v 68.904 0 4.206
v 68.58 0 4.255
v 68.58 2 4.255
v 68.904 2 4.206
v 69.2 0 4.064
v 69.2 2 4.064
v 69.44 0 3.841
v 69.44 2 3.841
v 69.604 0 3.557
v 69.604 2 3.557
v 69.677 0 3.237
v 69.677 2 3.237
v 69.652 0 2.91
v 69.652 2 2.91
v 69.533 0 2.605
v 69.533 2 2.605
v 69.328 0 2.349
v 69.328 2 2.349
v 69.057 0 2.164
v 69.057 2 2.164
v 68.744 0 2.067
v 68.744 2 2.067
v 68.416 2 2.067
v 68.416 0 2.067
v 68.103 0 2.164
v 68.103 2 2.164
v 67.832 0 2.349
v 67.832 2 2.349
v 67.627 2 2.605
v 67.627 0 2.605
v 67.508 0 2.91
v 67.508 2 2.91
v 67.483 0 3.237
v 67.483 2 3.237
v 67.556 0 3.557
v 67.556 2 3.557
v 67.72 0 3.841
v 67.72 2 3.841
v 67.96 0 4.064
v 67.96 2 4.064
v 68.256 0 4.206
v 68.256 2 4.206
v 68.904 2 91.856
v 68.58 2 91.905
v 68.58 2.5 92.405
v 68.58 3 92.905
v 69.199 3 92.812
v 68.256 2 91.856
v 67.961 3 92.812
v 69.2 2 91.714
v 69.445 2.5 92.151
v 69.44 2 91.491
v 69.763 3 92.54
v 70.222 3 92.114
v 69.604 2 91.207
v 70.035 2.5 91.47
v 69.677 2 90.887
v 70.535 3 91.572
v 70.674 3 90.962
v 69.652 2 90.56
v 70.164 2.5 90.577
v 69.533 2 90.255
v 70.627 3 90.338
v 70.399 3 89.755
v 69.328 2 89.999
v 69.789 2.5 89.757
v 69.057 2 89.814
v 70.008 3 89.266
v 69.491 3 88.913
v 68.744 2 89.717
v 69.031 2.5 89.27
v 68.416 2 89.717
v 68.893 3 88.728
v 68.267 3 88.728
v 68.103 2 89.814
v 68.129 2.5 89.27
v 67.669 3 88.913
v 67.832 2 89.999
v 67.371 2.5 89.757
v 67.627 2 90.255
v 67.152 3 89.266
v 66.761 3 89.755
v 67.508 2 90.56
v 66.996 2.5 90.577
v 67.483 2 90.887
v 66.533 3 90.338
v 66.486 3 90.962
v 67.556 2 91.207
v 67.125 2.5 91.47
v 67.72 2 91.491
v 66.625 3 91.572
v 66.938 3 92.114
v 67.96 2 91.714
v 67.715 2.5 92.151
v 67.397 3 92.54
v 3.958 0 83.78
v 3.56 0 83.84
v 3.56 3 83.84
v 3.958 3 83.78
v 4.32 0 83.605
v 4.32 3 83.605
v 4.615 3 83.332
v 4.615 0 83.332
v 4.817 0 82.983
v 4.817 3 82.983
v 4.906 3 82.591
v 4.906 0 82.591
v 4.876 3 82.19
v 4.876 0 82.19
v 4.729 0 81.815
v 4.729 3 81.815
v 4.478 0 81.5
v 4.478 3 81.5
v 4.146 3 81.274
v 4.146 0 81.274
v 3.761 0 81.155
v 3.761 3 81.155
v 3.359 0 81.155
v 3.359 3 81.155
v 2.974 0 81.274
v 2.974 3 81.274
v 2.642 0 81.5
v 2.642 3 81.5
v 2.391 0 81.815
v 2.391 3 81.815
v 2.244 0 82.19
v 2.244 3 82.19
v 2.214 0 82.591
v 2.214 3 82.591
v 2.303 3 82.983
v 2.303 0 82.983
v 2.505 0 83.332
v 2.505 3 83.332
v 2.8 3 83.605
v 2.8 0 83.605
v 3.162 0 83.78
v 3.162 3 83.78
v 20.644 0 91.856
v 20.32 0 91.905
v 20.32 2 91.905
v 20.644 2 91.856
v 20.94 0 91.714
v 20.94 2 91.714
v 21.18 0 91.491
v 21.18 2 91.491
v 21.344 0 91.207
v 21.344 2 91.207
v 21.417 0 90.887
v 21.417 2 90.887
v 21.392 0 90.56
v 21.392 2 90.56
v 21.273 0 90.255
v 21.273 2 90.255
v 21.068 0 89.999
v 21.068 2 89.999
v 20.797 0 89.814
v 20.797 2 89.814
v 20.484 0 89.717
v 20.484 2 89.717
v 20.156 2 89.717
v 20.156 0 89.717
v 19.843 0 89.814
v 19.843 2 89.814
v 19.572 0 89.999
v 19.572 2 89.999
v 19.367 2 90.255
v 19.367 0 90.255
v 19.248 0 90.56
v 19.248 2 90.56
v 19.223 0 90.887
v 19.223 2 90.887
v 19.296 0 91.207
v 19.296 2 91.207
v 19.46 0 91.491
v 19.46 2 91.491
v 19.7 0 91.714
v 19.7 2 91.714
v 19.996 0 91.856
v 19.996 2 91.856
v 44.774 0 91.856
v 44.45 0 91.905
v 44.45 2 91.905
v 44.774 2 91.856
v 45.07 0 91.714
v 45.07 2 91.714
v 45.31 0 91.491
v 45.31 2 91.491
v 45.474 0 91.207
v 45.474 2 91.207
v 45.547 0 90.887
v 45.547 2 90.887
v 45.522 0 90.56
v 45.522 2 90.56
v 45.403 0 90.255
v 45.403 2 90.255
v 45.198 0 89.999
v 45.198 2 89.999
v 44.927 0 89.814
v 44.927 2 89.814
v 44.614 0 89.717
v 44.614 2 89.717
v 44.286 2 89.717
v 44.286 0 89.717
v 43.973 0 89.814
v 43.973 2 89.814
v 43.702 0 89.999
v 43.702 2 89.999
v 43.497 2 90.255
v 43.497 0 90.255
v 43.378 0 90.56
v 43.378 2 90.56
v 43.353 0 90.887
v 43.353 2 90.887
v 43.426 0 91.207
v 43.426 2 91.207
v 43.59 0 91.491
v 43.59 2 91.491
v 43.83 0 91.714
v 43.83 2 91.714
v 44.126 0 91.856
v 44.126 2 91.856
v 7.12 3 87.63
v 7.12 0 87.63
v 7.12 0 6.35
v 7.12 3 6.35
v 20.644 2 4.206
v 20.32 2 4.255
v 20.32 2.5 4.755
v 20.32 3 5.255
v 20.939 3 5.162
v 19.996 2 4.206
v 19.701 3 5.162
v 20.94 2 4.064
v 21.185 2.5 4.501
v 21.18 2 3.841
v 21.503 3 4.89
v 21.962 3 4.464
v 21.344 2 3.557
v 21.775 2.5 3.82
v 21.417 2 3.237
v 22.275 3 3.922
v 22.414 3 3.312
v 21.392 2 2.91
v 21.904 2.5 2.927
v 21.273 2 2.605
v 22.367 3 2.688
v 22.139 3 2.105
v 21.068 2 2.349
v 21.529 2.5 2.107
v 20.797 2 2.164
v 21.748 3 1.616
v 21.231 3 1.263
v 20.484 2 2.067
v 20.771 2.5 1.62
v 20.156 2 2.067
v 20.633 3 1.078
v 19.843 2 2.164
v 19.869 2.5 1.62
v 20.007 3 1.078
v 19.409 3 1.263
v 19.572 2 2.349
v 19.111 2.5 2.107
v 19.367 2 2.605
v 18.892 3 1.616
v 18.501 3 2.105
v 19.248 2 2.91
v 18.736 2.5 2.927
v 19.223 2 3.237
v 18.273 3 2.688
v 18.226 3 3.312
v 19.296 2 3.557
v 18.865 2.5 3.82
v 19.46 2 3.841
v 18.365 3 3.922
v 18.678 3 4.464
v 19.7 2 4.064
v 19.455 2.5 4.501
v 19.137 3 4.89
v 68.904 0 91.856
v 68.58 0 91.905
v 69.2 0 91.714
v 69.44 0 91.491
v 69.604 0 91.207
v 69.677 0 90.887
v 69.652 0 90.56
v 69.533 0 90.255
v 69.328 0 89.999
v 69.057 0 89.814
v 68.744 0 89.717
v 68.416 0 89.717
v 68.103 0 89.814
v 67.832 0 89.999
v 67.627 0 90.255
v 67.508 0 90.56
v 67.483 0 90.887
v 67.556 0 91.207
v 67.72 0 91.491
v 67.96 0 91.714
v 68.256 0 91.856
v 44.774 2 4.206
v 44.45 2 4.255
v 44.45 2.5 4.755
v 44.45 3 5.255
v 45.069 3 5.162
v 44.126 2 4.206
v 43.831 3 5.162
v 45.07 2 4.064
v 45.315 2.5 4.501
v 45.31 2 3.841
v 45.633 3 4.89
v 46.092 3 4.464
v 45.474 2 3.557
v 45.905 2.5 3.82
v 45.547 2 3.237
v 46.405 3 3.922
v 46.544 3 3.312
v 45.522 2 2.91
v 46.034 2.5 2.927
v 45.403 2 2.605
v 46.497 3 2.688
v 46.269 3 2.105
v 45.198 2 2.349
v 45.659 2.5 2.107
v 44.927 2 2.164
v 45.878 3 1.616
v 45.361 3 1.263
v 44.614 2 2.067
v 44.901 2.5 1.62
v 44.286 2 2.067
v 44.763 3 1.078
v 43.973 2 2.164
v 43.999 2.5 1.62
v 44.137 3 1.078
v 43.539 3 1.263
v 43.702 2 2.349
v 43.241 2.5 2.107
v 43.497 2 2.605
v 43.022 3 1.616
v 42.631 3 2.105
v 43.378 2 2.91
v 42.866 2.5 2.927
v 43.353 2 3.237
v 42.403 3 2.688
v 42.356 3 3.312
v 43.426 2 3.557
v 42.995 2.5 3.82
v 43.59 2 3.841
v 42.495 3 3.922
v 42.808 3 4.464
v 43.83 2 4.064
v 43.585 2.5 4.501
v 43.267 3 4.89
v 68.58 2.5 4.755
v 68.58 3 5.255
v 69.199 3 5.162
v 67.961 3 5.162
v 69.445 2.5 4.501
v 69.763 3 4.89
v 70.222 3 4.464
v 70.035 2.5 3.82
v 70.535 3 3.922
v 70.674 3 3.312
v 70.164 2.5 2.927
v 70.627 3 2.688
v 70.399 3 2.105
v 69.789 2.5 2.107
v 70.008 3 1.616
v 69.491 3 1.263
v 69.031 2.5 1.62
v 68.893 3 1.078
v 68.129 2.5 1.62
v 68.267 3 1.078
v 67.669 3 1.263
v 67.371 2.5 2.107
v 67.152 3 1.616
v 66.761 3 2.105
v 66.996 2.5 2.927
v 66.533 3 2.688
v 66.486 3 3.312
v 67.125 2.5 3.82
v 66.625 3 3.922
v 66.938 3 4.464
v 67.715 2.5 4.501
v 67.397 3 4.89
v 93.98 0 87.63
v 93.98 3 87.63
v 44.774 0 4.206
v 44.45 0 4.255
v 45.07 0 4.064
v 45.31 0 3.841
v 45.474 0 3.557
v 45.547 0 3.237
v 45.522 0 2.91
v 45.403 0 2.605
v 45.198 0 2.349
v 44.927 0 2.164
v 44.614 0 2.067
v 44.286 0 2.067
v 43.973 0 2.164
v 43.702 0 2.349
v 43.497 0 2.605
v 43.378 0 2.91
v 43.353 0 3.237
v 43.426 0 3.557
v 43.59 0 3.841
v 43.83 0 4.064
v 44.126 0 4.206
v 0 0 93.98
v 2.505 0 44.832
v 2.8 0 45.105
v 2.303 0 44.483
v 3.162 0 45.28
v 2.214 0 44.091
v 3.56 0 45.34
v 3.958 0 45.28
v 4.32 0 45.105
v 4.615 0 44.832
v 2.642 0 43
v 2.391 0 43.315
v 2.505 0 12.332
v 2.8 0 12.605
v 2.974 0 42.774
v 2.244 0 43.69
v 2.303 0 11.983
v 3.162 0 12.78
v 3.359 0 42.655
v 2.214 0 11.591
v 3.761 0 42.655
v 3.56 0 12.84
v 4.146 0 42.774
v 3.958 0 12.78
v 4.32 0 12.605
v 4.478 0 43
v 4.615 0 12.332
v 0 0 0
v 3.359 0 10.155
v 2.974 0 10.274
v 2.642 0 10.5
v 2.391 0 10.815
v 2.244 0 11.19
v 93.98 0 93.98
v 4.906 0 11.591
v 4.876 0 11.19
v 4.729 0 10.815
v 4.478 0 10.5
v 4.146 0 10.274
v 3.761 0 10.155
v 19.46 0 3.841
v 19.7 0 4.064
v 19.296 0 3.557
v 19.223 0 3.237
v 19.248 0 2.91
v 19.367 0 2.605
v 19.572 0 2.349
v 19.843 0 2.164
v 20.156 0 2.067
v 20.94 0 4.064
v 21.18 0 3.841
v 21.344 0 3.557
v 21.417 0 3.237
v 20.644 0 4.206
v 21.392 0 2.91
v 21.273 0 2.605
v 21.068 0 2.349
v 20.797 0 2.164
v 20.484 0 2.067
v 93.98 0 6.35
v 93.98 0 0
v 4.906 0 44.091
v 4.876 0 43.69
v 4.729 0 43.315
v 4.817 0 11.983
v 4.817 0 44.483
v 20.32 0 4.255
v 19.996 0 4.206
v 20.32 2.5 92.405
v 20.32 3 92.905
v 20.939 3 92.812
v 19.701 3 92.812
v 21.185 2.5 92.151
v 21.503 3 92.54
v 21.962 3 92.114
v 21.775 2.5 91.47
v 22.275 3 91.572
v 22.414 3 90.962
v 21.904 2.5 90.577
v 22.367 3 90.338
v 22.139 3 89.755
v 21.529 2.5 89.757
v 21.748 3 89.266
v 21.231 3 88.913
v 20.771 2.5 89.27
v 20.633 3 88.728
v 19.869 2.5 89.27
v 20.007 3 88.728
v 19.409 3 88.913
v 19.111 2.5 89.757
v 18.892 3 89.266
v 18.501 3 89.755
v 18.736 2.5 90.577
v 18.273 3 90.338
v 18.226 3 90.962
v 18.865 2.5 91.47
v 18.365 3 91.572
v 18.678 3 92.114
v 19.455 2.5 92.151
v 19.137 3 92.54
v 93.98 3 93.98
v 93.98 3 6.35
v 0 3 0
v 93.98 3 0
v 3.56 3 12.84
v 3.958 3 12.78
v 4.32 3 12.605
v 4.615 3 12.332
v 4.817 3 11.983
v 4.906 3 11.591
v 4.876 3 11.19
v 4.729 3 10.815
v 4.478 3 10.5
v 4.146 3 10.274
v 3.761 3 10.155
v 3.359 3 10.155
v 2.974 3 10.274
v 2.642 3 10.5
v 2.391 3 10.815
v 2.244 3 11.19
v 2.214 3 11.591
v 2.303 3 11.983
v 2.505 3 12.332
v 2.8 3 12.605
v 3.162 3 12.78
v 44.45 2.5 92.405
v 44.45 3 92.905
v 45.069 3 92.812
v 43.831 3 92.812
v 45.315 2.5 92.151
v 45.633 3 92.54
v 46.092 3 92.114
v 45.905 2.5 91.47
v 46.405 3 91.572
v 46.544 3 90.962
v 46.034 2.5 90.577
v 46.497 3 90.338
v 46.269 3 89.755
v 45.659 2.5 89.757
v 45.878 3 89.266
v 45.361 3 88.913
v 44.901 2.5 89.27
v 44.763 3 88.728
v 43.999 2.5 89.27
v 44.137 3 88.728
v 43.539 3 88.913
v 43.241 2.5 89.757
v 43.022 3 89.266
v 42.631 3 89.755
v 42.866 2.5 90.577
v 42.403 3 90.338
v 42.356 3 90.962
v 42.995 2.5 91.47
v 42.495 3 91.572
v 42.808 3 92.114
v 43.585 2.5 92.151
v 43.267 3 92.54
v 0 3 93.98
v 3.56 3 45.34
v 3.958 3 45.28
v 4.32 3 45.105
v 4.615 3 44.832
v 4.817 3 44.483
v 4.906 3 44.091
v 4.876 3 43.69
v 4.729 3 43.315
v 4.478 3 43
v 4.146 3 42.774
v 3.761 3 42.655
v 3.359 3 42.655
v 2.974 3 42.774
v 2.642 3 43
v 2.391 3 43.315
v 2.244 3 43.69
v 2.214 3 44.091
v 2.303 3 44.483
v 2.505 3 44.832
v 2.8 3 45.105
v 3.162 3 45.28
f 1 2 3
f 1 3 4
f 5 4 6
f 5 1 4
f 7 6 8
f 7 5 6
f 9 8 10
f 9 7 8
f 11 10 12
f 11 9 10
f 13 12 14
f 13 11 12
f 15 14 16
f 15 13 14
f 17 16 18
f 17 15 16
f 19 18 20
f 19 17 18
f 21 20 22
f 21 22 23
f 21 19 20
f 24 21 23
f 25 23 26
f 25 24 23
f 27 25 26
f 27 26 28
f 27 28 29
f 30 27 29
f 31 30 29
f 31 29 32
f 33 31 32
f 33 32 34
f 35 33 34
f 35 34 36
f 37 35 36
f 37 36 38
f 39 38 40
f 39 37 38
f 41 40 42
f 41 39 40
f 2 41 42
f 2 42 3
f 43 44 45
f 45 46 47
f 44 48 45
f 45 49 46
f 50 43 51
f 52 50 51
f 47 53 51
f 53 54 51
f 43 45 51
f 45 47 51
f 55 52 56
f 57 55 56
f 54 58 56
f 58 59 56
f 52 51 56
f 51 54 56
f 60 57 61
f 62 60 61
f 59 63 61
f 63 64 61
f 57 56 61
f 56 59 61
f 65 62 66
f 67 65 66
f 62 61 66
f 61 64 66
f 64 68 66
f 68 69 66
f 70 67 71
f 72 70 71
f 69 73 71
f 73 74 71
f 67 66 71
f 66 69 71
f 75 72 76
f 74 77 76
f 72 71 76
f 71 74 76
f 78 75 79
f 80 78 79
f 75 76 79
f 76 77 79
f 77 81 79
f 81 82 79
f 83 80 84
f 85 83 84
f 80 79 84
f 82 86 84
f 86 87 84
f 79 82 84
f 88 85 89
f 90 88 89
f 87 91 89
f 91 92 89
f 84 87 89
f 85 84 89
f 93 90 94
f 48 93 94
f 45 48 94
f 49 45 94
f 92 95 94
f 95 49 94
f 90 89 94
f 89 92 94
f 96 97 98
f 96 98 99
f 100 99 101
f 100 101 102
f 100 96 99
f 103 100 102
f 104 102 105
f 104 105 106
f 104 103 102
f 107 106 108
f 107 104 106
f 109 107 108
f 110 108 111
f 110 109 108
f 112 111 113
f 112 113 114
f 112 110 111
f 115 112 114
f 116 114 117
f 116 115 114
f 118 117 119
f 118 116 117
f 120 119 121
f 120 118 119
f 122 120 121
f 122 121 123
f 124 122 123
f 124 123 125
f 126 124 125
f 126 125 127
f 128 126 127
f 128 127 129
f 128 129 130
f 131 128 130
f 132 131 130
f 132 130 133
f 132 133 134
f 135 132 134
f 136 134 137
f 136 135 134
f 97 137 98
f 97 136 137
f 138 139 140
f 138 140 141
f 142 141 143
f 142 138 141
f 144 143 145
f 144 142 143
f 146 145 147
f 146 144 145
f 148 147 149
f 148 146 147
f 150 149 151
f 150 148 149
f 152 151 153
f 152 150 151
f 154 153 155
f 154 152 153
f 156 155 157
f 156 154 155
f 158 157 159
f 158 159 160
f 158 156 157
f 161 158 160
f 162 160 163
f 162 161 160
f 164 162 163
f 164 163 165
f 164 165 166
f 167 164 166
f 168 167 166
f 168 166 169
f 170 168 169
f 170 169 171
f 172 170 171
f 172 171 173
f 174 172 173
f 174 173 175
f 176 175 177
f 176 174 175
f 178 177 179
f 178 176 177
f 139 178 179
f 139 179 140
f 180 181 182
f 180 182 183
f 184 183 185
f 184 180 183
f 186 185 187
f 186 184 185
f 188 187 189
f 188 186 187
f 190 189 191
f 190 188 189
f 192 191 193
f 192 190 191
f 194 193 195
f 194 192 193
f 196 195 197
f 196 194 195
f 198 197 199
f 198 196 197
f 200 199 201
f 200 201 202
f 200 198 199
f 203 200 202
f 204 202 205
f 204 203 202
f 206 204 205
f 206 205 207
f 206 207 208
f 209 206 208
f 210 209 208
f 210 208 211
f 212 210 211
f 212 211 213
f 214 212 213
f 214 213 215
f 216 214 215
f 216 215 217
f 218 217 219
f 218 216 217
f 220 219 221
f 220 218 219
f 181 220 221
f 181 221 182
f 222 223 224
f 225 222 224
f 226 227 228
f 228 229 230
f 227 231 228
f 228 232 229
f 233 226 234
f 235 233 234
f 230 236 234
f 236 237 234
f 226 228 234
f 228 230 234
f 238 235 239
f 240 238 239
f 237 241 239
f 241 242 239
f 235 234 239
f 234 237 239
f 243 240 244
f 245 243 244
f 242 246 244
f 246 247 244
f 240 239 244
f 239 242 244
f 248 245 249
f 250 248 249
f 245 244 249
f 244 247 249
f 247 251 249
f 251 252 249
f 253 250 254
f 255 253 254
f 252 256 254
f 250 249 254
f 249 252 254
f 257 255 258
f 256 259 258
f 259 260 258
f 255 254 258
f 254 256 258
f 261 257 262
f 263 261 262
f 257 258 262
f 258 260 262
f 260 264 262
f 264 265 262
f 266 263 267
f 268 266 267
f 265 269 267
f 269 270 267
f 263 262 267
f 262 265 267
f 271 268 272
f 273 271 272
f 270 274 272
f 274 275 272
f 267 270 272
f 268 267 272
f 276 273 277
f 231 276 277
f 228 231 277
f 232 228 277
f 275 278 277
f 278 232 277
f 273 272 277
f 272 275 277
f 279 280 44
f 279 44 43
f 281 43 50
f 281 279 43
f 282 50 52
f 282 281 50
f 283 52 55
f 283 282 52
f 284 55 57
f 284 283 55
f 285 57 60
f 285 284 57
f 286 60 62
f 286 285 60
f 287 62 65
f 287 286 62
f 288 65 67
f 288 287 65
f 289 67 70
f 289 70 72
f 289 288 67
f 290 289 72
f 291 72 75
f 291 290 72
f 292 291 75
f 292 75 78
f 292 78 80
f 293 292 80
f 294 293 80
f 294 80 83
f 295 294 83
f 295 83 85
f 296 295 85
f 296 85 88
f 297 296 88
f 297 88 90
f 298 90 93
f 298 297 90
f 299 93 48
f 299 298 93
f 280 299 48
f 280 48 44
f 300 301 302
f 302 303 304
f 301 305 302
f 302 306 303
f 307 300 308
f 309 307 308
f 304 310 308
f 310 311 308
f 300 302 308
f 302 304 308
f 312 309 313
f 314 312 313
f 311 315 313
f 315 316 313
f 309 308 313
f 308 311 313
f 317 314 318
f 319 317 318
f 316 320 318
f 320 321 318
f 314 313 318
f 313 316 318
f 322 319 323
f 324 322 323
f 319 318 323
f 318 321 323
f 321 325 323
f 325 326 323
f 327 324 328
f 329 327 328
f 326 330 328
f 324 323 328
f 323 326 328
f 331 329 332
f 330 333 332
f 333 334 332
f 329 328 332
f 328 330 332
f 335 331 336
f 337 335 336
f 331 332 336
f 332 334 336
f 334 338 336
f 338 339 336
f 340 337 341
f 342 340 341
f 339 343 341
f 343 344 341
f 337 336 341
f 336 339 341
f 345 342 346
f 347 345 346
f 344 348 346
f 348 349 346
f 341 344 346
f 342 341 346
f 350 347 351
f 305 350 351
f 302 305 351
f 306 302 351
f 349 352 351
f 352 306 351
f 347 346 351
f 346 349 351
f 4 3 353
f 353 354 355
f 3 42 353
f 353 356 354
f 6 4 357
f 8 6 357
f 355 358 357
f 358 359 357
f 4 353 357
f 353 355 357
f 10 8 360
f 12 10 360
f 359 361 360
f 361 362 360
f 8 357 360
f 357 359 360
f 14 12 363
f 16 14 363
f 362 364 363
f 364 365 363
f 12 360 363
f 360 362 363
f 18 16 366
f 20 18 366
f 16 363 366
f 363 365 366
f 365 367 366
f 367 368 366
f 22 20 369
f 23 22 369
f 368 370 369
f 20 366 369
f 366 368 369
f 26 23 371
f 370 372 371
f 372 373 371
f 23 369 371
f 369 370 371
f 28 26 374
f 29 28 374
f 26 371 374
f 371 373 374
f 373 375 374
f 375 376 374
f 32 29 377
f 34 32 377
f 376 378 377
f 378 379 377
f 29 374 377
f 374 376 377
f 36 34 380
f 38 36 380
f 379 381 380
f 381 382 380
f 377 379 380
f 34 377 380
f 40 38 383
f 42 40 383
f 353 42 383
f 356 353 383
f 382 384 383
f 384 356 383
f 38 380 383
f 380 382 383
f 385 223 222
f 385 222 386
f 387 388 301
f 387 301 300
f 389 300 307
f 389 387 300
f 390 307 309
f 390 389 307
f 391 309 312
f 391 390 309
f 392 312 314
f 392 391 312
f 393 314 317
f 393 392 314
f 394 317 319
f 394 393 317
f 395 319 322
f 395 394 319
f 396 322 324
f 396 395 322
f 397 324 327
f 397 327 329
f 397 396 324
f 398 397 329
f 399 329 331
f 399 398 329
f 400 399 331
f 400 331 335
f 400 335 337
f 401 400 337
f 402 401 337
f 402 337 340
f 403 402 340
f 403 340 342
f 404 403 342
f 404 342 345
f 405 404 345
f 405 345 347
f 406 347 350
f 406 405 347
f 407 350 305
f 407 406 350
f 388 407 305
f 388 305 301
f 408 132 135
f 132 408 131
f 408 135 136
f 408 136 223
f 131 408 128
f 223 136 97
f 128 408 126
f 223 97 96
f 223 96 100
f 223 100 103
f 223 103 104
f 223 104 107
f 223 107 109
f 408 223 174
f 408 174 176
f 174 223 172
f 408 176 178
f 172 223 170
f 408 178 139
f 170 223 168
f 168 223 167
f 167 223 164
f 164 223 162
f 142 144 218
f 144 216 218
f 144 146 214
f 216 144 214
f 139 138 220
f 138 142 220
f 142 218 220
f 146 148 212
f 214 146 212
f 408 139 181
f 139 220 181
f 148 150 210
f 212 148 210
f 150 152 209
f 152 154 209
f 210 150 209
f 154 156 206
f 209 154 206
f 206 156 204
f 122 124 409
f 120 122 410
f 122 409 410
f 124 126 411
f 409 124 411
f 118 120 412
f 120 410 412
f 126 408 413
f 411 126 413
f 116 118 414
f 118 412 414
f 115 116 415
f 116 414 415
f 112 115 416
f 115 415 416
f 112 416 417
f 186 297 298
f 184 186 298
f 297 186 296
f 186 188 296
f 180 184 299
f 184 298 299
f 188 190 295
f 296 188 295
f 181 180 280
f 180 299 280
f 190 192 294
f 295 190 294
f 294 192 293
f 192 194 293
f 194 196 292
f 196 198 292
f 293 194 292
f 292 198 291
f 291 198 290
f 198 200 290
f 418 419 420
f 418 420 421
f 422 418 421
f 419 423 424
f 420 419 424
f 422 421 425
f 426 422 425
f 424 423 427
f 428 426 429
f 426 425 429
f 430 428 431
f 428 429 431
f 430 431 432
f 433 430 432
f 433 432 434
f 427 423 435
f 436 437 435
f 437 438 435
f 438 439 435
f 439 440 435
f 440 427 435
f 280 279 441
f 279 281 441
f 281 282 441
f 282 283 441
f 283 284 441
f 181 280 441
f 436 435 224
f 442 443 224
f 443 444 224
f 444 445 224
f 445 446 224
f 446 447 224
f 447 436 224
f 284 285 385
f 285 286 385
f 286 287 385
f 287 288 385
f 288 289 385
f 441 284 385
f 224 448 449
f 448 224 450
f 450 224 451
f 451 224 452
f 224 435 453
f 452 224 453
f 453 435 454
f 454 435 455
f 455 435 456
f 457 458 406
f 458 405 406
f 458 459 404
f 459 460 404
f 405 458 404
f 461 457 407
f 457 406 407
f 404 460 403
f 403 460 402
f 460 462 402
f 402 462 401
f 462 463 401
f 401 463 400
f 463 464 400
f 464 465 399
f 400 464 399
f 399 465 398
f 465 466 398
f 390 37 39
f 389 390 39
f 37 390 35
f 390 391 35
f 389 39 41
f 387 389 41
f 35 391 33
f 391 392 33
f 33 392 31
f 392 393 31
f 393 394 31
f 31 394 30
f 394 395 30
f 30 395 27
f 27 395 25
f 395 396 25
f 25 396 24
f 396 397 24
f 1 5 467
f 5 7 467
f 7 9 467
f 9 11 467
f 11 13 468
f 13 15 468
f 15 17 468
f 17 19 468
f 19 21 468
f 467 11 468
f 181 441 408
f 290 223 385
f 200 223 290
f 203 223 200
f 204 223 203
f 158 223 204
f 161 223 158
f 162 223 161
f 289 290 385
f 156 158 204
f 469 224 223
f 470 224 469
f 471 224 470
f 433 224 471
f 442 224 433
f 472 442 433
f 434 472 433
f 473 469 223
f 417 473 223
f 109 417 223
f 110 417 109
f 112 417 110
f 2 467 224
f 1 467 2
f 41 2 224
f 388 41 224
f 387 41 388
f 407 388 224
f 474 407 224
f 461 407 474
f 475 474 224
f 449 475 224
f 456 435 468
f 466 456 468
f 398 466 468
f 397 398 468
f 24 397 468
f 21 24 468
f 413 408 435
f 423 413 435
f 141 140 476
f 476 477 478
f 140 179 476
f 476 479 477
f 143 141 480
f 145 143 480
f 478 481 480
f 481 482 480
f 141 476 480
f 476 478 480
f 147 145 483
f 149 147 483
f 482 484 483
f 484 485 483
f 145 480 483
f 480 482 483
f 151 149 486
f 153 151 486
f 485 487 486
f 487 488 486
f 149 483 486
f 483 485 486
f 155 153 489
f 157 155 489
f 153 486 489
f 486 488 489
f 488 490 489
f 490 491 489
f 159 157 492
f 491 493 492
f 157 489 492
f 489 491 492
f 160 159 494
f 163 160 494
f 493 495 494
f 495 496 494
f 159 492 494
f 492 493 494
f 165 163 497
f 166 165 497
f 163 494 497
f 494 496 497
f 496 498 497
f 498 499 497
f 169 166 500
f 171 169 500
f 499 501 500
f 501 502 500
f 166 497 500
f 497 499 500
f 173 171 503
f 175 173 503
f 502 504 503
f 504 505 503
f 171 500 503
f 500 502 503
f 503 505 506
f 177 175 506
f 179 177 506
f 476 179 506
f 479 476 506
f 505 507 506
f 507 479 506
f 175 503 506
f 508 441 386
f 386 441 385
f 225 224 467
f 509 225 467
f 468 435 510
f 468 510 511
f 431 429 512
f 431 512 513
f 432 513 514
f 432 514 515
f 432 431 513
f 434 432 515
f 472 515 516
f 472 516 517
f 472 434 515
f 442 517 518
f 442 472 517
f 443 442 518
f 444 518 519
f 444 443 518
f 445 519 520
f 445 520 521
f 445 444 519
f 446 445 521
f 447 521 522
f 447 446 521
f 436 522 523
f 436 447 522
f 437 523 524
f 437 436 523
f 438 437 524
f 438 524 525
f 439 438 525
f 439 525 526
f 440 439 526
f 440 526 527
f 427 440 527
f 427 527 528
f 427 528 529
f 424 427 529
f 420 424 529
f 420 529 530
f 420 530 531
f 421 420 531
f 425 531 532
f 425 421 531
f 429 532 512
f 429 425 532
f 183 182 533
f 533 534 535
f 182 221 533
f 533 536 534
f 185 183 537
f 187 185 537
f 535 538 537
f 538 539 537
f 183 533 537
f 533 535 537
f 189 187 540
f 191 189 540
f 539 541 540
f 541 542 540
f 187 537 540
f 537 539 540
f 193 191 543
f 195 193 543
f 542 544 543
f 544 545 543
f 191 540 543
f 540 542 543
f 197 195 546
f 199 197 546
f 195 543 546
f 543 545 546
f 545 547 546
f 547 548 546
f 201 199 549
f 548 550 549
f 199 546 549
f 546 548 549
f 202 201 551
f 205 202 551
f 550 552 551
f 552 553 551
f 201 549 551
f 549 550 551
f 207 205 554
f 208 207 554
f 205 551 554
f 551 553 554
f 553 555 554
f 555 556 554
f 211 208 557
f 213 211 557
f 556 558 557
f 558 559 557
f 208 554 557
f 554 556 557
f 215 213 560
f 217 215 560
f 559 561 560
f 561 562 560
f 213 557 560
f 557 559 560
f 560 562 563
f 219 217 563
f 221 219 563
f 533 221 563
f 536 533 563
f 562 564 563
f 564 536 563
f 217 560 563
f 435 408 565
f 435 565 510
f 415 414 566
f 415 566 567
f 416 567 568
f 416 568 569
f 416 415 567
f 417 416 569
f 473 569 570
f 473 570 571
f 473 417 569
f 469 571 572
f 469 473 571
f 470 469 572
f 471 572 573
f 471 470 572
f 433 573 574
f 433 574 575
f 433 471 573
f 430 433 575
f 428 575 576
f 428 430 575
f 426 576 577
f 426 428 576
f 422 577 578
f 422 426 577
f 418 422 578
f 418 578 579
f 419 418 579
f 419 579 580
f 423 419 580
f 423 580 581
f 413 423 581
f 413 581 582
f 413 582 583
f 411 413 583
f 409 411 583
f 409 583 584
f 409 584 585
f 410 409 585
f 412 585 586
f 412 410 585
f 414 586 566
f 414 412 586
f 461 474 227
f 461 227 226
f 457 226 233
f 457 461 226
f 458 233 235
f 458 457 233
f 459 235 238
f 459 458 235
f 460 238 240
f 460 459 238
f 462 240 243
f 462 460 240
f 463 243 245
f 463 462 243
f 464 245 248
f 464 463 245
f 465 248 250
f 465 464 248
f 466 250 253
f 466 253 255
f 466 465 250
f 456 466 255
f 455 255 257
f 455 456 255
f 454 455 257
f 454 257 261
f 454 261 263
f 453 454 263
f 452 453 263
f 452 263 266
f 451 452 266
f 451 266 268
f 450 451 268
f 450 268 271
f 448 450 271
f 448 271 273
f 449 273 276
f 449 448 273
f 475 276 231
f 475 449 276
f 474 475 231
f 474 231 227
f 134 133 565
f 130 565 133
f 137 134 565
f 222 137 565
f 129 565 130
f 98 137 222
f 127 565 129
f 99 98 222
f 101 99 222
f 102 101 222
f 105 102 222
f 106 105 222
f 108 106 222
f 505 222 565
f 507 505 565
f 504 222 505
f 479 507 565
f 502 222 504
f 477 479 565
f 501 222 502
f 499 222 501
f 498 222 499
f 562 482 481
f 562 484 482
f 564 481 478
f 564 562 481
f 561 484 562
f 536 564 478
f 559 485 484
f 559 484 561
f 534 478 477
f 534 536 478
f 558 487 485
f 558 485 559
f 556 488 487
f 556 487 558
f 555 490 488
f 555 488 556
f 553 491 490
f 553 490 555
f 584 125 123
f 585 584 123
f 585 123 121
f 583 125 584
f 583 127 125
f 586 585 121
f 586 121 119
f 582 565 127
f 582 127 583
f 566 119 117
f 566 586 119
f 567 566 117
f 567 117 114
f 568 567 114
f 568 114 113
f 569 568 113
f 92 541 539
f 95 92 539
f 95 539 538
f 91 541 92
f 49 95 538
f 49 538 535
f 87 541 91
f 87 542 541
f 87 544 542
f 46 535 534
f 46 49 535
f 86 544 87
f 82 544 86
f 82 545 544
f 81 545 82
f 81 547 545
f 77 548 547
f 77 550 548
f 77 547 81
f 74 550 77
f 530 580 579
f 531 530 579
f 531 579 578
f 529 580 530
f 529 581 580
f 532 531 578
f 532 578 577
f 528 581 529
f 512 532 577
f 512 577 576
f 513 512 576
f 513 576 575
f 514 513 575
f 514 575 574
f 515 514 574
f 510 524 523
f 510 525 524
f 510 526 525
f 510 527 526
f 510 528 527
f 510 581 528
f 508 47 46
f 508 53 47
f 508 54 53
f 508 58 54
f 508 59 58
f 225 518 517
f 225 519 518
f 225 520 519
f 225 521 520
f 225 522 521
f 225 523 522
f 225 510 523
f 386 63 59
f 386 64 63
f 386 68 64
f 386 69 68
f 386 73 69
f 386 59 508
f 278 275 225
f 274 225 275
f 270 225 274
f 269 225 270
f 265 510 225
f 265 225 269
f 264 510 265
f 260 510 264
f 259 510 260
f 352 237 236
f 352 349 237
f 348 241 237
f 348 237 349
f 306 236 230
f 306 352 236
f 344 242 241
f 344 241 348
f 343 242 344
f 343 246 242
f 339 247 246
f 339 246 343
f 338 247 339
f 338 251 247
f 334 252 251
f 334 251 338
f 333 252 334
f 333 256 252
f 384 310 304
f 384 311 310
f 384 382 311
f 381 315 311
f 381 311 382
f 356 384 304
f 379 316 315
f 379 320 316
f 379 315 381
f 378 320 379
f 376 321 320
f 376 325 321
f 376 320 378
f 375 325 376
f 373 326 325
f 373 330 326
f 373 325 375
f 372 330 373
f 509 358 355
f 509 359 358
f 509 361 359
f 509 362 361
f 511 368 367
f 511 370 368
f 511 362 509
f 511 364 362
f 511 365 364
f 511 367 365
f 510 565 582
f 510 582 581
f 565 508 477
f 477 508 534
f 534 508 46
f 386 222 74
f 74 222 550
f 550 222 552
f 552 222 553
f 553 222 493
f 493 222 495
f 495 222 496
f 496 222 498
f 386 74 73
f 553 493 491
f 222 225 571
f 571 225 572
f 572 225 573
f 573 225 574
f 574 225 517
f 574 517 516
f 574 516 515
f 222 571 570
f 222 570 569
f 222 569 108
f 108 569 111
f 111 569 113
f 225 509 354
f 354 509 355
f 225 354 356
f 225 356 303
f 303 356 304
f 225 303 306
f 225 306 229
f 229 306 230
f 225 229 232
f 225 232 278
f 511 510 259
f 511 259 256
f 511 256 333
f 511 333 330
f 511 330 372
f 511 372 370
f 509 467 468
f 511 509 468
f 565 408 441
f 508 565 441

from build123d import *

# Parameters (mm, degrees)
SKETCH2_W           = 7.119984
SKETCH2_H           = 81.28
SKETCH2_R           = 1.35
SKETCH2_W_2         = 93.98
SKETCH2_H_2         = 6.35
SKETCH2_R_2         = 1.1
BOSS_EXTRUDE1_DEPTH = 3
CHAMFER1_SIZE       = 1


with BuildPart() as part:
    # Sketch2 → Boss-Extrude1 (new body)
    # profile 1 of 3: a face of its own
    with BuildSketch(Plane(origin=(0, 0, 0), x_dir=(1, 0, 0), z_dir=(0, 1, 0))):
        with Locations((3.559992, -46.99)):
            Rectangle(SKETCH2_W, SKETCH2_H)
        with Locations(Location((3.559992, -82.490012, 0), (0, 0, 270))):
            Circle(SKETCH2_R, mode=Mode.SUBTRACT)
        with Locations(Location((3.559992, -43.990012, 0), (0, 0, 270))):
            Circle(SKETCH2_R, mode=Mode.SUBTRACT)
        with Locations(Location((3.559992, -11.490012, 0), (0, 0, 270))):
            Circle(SKETCH2_R, mode=Mode.SUBTRACT)
    # profile 2 of 3: a face of its own
    with BuildSketch(Plane(origin=(0, 0, 0), x_dir=(1, 0, 0), z_dir=(0, 1, 0))):
        with Locations((46.99, -3.175)):
            Rectangle(SKETCH2_W_2, SKETCH2_H_2)
        with Locations(Location((68.58, -3.155, 0), (0, 0, 270))):
            Circle(SKETCH2_R_2, mode=Mode.SUBTRACT)
        with Locations(Location((44.45, -3.155, 0), (0, 0, 270))):
            Circle(SKETCH2_R_2, mode=Mode.SUBTRACT)
        with Locations(Location((20.32, -3.155, 0), (0, 0, 270))):
            Circle(SKETCH2_R_2, mode=Mode.SUBTRACT)
    # profile 3 of 3: a face of its own
    with BuildSketch(Plane(origin=(0, 0, 0), x_dir=(1, 0, 0), z_dir=(0, 1, 0))):
        with Locations((46.99, -90.805)):
            Rectangle(SKETCH2_W_2, SKETCH2_H_2)
        with Locations(Location((68.58, -90.805, 0), (0, 0, 270))):
            Circle(SKETCH2_R_2, mode=Mode.SUBTRACT)
        with Locations(Location((44.45, -90.805, 0), (0, 0, 270))):
            Circle(SKETCH2_R_2, mode=Mode.SUBTRACT)
        with Locations(Location((20.32, -90.805, 0), (0, 0, 270))):
            Circle(SKETCH2_R_2, mode=Mode.SUBTRACT)
    extrude(amount=BOSS_EXTRUDE1_DEPTH)

    # Chamfer1
    chamfer1_edges = [part.edges().sort_by_distance(p)[0] for p in [
        (20.32, 3, 89.705),
        (68.58, 3, 2.055),
        (44.45, 3, 2.055),
        (20.32, 3, 2.055),
        (68.58, 3, 89.705),
        (44.45, 3, 89.705),
    ]]
    chamfer(chamfer1_edges, length=CHAMFER1_SIZE)


solid = part.part
